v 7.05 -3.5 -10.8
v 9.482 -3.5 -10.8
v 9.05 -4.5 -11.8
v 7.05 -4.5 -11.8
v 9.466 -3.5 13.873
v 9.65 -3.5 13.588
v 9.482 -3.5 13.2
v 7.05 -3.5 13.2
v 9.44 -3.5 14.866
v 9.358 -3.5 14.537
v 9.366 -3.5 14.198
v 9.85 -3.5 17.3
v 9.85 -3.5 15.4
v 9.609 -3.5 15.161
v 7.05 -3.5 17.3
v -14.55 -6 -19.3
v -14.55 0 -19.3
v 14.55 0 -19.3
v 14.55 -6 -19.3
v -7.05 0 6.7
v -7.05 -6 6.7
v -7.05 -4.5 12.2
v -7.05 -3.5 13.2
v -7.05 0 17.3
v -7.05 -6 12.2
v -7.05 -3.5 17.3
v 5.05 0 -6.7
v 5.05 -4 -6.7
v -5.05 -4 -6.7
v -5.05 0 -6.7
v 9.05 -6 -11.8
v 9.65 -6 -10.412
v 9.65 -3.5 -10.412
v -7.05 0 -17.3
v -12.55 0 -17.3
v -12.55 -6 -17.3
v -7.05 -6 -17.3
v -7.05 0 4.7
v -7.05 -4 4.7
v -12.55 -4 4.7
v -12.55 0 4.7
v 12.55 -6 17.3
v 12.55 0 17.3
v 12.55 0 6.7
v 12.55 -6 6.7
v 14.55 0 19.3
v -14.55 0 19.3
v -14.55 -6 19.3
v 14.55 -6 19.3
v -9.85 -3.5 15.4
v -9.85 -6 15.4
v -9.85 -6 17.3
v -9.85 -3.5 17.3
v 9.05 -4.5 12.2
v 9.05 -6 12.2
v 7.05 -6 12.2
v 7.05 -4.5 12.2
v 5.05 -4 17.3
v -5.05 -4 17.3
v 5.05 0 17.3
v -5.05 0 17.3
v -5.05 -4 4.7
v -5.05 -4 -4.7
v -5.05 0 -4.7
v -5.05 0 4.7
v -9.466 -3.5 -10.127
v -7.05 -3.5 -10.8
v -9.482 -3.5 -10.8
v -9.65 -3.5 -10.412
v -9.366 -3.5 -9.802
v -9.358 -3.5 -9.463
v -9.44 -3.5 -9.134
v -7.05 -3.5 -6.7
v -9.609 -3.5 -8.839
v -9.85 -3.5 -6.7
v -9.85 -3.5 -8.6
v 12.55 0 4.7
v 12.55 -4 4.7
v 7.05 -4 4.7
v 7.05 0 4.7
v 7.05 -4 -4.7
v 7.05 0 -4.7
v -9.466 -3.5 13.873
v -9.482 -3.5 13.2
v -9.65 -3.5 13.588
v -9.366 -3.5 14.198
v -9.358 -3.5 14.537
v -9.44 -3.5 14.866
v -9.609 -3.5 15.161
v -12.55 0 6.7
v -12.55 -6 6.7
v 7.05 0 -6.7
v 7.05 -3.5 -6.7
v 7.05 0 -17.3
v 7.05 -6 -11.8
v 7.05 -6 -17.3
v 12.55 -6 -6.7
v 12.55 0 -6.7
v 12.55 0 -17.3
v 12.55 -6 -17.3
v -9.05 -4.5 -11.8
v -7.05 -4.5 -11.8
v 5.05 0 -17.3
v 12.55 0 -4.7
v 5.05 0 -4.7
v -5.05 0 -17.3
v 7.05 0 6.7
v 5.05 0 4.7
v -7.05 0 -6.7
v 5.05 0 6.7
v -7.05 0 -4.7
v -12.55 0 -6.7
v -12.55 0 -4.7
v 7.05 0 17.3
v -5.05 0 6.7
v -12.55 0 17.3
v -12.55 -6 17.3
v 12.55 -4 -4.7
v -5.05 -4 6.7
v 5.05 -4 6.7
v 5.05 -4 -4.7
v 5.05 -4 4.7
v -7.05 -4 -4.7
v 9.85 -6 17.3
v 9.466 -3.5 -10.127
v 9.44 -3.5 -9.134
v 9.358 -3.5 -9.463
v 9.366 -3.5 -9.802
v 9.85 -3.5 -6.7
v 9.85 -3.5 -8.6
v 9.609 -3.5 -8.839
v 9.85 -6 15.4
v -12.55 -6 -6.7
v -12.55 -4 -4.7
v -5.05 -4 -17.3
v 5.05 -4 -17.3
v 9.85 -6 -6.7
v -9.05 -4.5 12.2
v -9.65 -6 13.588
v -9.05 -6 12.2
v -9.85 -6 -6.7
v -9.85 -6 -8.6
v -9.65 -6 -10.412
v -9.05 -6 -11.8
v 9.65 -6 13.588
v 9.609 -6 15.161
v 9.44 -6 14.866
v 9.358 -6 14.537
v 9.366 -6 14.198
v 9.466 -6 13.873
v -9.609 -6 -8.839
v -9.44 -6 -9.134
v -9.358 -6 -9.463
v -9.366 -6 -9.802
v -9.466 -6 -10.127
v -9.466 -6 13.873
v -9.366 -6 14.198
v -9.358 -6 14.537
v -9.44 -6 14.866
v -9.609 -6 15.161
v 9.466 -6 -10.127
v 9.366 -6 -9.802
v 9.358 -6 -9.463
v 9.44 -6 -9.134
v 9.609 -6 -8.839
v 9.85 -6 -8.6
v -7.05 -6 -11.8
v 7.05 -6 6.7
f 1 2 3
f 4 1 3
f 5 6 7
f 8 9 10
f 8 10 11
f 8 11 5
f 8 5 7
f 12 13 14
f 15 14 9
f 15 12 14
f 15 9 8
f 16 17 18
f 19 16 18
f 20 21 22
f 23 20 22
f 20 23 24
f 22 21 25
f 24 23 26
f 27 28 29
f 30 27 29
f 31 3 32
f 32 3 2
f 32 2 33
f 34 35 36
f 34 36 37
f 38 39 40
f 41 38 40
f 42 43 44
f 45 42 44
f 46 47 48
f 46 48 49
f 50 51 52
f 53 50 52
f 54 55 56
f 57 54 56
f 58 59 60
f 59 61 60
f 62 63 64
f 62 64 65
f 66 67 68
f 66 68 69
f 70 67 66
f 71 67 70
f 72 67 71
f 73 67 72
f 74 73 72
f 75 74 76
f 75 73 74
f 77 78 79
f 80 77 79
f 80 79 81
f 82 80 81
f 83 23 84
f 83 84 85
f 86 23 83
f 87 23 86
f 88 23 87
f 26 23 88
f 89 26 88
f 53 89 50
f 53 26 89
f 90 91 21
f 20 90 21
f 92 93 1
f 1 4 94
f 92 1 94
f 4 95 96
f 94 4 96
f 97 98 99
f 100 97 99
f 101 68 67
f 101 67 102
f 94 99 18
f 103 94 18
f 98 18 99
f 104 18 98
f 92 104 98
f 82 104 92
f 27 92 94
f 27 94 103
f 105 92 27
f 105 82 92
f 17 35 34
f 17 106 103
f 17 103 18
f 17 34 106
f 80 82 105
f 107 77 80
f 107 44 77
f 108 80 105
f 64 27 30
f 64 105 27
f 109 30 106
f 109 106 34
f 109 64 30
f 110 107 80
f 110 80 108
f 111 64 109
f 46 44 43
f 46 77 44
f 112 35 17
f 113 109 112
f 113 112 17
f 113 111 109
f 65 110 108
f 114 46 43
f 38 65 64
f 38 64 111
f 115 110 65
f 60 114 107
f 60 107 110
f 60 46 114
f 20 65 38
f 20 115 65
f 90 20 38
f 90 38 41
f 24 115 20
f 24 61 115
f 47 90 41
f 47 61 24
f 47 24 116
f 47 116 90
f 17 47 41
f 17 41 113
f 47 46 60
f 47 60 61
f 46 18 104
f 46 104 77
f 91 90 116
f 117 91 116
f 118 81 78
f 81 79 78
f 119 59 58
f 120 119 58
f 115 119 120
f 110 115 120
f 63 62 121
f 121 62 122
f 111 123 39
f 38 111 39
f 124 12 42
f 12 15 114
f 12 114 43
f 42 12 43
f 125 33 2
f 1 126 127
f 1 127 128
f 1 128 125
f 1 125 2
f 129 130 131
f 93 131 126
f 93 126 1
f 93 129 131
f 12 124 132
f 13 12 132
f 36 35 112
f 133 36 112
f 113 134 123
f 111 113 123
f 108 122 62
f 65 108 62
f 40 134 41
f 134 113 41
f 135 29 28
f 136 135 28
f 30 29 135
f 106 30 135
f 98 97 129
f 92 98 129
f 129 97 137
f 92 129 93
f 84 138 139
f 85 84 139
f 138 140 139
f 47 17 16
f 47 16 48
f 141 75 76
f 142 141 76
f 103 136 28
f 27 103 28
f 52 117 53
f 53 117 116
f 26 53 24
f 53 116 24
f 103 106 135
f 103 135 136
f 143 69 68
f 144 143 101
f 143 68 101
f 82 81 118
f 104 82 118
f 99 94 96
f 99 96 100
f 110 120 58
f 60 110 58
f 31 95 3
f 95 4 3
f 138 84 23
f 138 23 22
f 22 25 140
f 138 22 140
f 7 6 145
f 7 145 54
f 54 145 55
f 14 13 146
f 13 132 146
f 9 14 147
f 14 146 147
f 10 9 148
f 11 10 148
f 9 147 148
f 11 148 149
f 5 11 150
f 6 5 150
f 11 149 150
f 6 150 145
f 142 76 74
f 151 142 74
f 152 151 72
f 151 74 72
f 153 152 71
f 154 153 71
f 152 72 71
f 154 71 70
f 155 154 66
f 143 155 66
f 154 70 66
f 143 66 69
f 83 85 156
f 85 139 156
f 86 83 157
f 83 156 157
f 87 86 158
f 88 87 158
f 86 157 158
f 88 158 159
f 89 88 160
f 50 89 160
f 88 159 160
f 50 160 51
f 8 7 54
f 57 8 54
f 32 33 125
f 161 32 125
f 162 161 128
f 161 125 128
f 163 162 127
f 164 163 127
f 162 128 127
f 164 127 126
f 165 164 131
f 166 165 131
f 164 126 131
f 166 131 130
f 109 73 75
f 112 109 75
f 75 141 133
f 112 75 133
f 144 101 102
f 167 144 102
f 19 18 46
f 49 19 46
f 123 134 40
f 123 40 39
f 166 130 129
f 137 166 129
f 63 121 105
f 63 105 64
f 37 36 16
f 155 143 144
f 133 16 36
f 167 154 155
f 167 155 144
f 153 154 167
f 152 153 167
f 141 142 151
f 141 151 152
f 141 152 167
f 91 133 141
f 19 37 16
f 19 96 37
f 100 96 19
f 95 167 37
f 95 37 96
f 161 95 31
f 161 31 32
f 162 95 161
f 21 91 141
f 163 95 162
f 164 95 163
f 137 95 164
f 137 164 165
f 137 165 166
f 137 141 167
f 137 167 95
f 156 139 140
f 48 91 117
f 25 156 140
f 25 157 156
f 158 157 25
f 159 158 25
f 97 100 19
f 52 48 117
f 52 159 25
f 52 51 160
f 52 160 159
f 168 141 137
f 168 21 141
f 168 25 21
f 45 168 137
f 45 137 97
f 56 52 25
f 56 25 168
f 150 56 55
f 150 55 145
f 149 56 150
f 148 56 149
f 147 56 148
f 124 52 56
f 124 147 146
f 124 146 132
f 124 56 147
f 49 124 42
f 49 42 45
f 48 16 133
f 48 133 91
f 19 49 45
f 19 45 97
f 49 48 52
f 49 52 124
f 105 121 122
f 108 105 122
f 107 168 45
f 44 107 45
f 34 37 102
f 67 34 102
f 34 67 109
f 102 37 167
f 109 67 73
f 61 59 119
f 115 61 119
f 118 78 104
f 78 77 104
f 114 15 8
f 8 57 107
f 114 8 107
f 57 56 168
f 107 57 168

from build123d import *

# Parameters (mm, degrees)
F3_W        = 29.1
F3_H        = 38.6
F4_DEPTH    = 6
F5_T        = 2
F7_DEPTH    = 0.5
F8_T1_DEPTH = 4.571682988
F8_T3_DEPTH = 4.571682988
F9_W        = 10.1
F9_H        = 9.4
F10_DEPTH   = 4


# Not quite as in the source:
# - a fillet or chamfer that OpenCascade refuses, or shapes differently, is made with other operations: its cross-section is extruded or revolved along the edge and cut away or added
# - a feature of the source that left no trace in its solid (it failed there, or was rolled back) is left out
# - a shell that OpenCascade refuses in one call is made with other operations: the cavity is built on its own and cut out


with BuildPart() as f4:
    # F3 (on Front) → F4 (new body)
    with BuildSketch(Plane.XZ):
        Rectangle(F3_W, F3_H)
        with BuildLine():
            Line((-12.55, -17.3), (-12.55, -6.7))
            Line((-12.55, -6.7), (-9.85, -6.7))
            Line((-9.85, -6.7), (-9.85, -8.6))
            ThreePointArc((-9.85, -8.6), (-9.3575419845, -9.4628939105), (-9.65, -10.4124038405))
            Line((-9.65, -10.4124038405), (-9.05, -11.8))
            Line((-9.05, -11.8), (-7.05, -11.8))
            Line((-7.05, -11.8), (-7.05, -17.3))
            Line((-7.05, -17.3), (-12.55, -17.3))
        make_face(mode=Mode.SUBTRACT)
        with BuildLine():
            Line((12.55, -6.7), (12.55, -17.3))
            Line((12.55, -17.3), (7.05, -17.3))
            Line((7.05, -17.3), (7.05, -11.8))
            Line((7.05, -11.8), (9.05, -11.8))
            Line((9.05, -11.8), (9.65, -10.4124038405))
            ThreePointArc((9.65, -10.4124038405), (9.3575419845, -9.4628939105), (9.85, -8.6))
            Line((9.85, -8.6), (9.85, -6.7))
            Line((9.85, -6.7), (12.55, -6.7))
        make_face(mode=Mode.SUBTRACT)
        with BuildLine():
            Line((-12.55, 6.7), (-12.55, 17.3))
            Line((-12.55, 17.3), (-9.85, 17.3))
            Line((-9.85, 17.3), (-9.85, 15.4))
            ThreePointArc((-9.85, 15.4), (-9.3575419845, 14.5371060895), (-9.65, 13.5875961595))
            Line((-9.65, 13.5875961595), (-9.05, 12.2))
            Line((-9.05, 12.2), (-7.05, 12.2))
            Line((-7.05, 12.2), (-7.05, 6.7))
            Line((-7.05, 6.7), (-12.55, 6.7))
        make_face(mode=Mode.SUBTRACT)
        with BuildLine():
            Line((7.05, 6.7), (7.05, 12.2))
            Line((7.05, 12.2), (9.05, 12.2))
            Line((9.05, 12.2), (9.65, 13.5875961595))
            ThreePointArc((9.65, 13.5875961595), (9.3575419845, 14.5371060895), (9.85, 15.4))
            Line((9.85, 15.4), (9.85, 17.3))
            Line((9.85, 17.3), (12.55, 17.3))
            Line((12.55, 17.3), (12.55, 6.7))
            Line((12.55, 6.7), (7.05, 6.7))
        make_face(mode=Mode.SUBTRACT)
    extrude(amount=F4_DEPTH)

    # F5: shell of thickness 2, made by hand


with BuildPart() as f5_core1:
    # F5_t2: copy of F4
    add(f4.part)

    # the walls: a layer under each face that stays
    f5_faces = [f5_core1.faces().sort_by_distance(p)[0] for p in [
        (14.55, -3, 0),
        (0, -3, 19.3),
        (-14.55, -3, 0),
        (0, -3, -19.3),
        (0, -6, 0),
    ]]
    thicken(f5_faces, amount=-F5_T, mode=Mode.SUBTRACT)


with BuildPart() as f4_1:
    add(f4.part)

    # what is left inside the walls is the cavity
    f5_cavity = [f5_core1.part.solids().sort_by_distance(p)[0] for p in [
        (0, -0.02, -5.766667),
    ]]
    add(f5_cavity, mode=Mode.SUBTRACT)

    # F6 (on face) → F7 (join)
    with BuildSketch(Plane(origin=(0, -4, 0), x_dir=(-1, 0, 0), z_dir=(0, 1, 0))):
        with BuildLine():
            Line((-7.05, 17.3), (-9.85, 17.3))
            Line((-9.85, 17.3), (-9.85, 15.4))
            ThreePointArc((-9.85, 15.4), (-9.3575419845, 14.5371060895), (-9.65, 13.5875961595))
            Line((-9.65, 13.5875961595), (-9.05, 12.2))
            Line((-9.05, 12.2), (-7.05, 12.2))
            Line((-7.05, 12.2), (-7.05, 17.3))
        make_face()
        with BuildLine():
            Line((9.85, 17.3), (7.05, 17.3))
            Line((7.05, 17.3), (7.05, 12.2))
            Line((7.05, 12.2), (9.05, 12.2))
            Line((9.05, 12.2), (9.65, 13.5875961595))
            ThreePointArc((9.65, 13.5875961595), (9.3575419845, 14.5371060895), (9.85, 15.4))
            Line((9.85, 15.4), (9.85, 17.3))
        make_face()
        with BuildLine():
            Line((-9.65, -10.4124038405), (-9.05, -11.8))
            Line((-9.05, -11.8), (-7.05, -11.8))
            Line((-7.05, -11.8), (-7.05, -6.7))
            Line((-7.05, -6.7), (-9.85, -6.7))
            Line((-9.85, -6.7), (-9.85, -8.6))
            ThreePointArc((-9.85, -8.6), (-9.3575419845, -9.4628939105), (-9.65, -10.4124038405))
        make_face()
        with BuildLine():
            Line((9.85, -6.7), (7.05, -6.7))
            Line((7.05, -6.7), (7.05, -11.8))
            Line((7.05, -11.8), (9.05, -11.8))
            Line((9.05, -11.8), (9.65, -10.4124038405))
            ThreePointArc((9.65, -10.4124038405), (9.3575419845, -9.4628939105), (9.85, -8.6))
            Line((9.85, -8.6), (9.85, -6.7))
        make_face()
    extrude(amount=F7_DEPTH)

    # F8: chamfer of 1 on 4 edges, made by hand

    # F8_s2 → F8_t1 (cut)
    with BuildSketch(Plane.YZ.offset(7.05)):
        Polygon((-3.5, -10.8), (-4.5, -11.8), (-3.5, -11.8), align=None)
        Polygon((-3.5, 13.2), (-4.5, 12.2), (-3.5, 12.2), align=None)
    extrude(amount=F8_T1_DEPTH, mode=Mode.SUBTRACT)

    # F8_s4 → F8_t3 (cut)
    with BuildSketch(Plane.YZ.offset(-11.621682988)):
        Polygon((-3.5, -10.8), (-4.5, -11.8), (-3.5, -11.8), align=None)
        Polygon((-3.5, 13.2), (-4.5, 12.2), (-3.5, 12.2), align=None)
    extrude(amount=F8_T3_DEPTH, mode=Mode.SUBTRACT)

    # F9 (on face) → F10 (join, through all)
    with BuildSketch(Plane(origin=(0, -4, 0), x_dir=(-1, 0, 0), z_dir=(0, 1, 0))):
        Polygon((7.05, -17.3), (7.05, -11.3), (7.05, -6.7), (9.85, -6.7), (12.55, -6.7), (12.55, -4.7), (7.05, -4.7), (7.05, 4.7), (12.55, 4.7), (12.55, 6.7), (7.05, 6.7), (7.05, 12.7), (7.05, 17.3), (5.05, 17.3), (5.05, 6.7), (-5.05, 6.7), (-5.05, 17.3), (-7.05, 17.3), (-7.05, 12.7), (-7.05, 6.7), (-12.55, 6.7), (-12.55, 4.7), (-7.05, 4.7), (-7.05, -4.7), (-12.55, -4.7), (-12.55, -6.7), (-9.85, -6.7), (-7.05, -6.7), (-7.05, -11.3), (-7.05, -17.3), (-5.05, -17.3), (-5.05, -6.7), (5.05, -6.7), (5.05, -17.3), align=None)
        Rectangle(F9_W, F9_H, mode=Mode.SUBTRACT)
    extrude(amount=F10_DEPTH)


solid = f4_1.part
